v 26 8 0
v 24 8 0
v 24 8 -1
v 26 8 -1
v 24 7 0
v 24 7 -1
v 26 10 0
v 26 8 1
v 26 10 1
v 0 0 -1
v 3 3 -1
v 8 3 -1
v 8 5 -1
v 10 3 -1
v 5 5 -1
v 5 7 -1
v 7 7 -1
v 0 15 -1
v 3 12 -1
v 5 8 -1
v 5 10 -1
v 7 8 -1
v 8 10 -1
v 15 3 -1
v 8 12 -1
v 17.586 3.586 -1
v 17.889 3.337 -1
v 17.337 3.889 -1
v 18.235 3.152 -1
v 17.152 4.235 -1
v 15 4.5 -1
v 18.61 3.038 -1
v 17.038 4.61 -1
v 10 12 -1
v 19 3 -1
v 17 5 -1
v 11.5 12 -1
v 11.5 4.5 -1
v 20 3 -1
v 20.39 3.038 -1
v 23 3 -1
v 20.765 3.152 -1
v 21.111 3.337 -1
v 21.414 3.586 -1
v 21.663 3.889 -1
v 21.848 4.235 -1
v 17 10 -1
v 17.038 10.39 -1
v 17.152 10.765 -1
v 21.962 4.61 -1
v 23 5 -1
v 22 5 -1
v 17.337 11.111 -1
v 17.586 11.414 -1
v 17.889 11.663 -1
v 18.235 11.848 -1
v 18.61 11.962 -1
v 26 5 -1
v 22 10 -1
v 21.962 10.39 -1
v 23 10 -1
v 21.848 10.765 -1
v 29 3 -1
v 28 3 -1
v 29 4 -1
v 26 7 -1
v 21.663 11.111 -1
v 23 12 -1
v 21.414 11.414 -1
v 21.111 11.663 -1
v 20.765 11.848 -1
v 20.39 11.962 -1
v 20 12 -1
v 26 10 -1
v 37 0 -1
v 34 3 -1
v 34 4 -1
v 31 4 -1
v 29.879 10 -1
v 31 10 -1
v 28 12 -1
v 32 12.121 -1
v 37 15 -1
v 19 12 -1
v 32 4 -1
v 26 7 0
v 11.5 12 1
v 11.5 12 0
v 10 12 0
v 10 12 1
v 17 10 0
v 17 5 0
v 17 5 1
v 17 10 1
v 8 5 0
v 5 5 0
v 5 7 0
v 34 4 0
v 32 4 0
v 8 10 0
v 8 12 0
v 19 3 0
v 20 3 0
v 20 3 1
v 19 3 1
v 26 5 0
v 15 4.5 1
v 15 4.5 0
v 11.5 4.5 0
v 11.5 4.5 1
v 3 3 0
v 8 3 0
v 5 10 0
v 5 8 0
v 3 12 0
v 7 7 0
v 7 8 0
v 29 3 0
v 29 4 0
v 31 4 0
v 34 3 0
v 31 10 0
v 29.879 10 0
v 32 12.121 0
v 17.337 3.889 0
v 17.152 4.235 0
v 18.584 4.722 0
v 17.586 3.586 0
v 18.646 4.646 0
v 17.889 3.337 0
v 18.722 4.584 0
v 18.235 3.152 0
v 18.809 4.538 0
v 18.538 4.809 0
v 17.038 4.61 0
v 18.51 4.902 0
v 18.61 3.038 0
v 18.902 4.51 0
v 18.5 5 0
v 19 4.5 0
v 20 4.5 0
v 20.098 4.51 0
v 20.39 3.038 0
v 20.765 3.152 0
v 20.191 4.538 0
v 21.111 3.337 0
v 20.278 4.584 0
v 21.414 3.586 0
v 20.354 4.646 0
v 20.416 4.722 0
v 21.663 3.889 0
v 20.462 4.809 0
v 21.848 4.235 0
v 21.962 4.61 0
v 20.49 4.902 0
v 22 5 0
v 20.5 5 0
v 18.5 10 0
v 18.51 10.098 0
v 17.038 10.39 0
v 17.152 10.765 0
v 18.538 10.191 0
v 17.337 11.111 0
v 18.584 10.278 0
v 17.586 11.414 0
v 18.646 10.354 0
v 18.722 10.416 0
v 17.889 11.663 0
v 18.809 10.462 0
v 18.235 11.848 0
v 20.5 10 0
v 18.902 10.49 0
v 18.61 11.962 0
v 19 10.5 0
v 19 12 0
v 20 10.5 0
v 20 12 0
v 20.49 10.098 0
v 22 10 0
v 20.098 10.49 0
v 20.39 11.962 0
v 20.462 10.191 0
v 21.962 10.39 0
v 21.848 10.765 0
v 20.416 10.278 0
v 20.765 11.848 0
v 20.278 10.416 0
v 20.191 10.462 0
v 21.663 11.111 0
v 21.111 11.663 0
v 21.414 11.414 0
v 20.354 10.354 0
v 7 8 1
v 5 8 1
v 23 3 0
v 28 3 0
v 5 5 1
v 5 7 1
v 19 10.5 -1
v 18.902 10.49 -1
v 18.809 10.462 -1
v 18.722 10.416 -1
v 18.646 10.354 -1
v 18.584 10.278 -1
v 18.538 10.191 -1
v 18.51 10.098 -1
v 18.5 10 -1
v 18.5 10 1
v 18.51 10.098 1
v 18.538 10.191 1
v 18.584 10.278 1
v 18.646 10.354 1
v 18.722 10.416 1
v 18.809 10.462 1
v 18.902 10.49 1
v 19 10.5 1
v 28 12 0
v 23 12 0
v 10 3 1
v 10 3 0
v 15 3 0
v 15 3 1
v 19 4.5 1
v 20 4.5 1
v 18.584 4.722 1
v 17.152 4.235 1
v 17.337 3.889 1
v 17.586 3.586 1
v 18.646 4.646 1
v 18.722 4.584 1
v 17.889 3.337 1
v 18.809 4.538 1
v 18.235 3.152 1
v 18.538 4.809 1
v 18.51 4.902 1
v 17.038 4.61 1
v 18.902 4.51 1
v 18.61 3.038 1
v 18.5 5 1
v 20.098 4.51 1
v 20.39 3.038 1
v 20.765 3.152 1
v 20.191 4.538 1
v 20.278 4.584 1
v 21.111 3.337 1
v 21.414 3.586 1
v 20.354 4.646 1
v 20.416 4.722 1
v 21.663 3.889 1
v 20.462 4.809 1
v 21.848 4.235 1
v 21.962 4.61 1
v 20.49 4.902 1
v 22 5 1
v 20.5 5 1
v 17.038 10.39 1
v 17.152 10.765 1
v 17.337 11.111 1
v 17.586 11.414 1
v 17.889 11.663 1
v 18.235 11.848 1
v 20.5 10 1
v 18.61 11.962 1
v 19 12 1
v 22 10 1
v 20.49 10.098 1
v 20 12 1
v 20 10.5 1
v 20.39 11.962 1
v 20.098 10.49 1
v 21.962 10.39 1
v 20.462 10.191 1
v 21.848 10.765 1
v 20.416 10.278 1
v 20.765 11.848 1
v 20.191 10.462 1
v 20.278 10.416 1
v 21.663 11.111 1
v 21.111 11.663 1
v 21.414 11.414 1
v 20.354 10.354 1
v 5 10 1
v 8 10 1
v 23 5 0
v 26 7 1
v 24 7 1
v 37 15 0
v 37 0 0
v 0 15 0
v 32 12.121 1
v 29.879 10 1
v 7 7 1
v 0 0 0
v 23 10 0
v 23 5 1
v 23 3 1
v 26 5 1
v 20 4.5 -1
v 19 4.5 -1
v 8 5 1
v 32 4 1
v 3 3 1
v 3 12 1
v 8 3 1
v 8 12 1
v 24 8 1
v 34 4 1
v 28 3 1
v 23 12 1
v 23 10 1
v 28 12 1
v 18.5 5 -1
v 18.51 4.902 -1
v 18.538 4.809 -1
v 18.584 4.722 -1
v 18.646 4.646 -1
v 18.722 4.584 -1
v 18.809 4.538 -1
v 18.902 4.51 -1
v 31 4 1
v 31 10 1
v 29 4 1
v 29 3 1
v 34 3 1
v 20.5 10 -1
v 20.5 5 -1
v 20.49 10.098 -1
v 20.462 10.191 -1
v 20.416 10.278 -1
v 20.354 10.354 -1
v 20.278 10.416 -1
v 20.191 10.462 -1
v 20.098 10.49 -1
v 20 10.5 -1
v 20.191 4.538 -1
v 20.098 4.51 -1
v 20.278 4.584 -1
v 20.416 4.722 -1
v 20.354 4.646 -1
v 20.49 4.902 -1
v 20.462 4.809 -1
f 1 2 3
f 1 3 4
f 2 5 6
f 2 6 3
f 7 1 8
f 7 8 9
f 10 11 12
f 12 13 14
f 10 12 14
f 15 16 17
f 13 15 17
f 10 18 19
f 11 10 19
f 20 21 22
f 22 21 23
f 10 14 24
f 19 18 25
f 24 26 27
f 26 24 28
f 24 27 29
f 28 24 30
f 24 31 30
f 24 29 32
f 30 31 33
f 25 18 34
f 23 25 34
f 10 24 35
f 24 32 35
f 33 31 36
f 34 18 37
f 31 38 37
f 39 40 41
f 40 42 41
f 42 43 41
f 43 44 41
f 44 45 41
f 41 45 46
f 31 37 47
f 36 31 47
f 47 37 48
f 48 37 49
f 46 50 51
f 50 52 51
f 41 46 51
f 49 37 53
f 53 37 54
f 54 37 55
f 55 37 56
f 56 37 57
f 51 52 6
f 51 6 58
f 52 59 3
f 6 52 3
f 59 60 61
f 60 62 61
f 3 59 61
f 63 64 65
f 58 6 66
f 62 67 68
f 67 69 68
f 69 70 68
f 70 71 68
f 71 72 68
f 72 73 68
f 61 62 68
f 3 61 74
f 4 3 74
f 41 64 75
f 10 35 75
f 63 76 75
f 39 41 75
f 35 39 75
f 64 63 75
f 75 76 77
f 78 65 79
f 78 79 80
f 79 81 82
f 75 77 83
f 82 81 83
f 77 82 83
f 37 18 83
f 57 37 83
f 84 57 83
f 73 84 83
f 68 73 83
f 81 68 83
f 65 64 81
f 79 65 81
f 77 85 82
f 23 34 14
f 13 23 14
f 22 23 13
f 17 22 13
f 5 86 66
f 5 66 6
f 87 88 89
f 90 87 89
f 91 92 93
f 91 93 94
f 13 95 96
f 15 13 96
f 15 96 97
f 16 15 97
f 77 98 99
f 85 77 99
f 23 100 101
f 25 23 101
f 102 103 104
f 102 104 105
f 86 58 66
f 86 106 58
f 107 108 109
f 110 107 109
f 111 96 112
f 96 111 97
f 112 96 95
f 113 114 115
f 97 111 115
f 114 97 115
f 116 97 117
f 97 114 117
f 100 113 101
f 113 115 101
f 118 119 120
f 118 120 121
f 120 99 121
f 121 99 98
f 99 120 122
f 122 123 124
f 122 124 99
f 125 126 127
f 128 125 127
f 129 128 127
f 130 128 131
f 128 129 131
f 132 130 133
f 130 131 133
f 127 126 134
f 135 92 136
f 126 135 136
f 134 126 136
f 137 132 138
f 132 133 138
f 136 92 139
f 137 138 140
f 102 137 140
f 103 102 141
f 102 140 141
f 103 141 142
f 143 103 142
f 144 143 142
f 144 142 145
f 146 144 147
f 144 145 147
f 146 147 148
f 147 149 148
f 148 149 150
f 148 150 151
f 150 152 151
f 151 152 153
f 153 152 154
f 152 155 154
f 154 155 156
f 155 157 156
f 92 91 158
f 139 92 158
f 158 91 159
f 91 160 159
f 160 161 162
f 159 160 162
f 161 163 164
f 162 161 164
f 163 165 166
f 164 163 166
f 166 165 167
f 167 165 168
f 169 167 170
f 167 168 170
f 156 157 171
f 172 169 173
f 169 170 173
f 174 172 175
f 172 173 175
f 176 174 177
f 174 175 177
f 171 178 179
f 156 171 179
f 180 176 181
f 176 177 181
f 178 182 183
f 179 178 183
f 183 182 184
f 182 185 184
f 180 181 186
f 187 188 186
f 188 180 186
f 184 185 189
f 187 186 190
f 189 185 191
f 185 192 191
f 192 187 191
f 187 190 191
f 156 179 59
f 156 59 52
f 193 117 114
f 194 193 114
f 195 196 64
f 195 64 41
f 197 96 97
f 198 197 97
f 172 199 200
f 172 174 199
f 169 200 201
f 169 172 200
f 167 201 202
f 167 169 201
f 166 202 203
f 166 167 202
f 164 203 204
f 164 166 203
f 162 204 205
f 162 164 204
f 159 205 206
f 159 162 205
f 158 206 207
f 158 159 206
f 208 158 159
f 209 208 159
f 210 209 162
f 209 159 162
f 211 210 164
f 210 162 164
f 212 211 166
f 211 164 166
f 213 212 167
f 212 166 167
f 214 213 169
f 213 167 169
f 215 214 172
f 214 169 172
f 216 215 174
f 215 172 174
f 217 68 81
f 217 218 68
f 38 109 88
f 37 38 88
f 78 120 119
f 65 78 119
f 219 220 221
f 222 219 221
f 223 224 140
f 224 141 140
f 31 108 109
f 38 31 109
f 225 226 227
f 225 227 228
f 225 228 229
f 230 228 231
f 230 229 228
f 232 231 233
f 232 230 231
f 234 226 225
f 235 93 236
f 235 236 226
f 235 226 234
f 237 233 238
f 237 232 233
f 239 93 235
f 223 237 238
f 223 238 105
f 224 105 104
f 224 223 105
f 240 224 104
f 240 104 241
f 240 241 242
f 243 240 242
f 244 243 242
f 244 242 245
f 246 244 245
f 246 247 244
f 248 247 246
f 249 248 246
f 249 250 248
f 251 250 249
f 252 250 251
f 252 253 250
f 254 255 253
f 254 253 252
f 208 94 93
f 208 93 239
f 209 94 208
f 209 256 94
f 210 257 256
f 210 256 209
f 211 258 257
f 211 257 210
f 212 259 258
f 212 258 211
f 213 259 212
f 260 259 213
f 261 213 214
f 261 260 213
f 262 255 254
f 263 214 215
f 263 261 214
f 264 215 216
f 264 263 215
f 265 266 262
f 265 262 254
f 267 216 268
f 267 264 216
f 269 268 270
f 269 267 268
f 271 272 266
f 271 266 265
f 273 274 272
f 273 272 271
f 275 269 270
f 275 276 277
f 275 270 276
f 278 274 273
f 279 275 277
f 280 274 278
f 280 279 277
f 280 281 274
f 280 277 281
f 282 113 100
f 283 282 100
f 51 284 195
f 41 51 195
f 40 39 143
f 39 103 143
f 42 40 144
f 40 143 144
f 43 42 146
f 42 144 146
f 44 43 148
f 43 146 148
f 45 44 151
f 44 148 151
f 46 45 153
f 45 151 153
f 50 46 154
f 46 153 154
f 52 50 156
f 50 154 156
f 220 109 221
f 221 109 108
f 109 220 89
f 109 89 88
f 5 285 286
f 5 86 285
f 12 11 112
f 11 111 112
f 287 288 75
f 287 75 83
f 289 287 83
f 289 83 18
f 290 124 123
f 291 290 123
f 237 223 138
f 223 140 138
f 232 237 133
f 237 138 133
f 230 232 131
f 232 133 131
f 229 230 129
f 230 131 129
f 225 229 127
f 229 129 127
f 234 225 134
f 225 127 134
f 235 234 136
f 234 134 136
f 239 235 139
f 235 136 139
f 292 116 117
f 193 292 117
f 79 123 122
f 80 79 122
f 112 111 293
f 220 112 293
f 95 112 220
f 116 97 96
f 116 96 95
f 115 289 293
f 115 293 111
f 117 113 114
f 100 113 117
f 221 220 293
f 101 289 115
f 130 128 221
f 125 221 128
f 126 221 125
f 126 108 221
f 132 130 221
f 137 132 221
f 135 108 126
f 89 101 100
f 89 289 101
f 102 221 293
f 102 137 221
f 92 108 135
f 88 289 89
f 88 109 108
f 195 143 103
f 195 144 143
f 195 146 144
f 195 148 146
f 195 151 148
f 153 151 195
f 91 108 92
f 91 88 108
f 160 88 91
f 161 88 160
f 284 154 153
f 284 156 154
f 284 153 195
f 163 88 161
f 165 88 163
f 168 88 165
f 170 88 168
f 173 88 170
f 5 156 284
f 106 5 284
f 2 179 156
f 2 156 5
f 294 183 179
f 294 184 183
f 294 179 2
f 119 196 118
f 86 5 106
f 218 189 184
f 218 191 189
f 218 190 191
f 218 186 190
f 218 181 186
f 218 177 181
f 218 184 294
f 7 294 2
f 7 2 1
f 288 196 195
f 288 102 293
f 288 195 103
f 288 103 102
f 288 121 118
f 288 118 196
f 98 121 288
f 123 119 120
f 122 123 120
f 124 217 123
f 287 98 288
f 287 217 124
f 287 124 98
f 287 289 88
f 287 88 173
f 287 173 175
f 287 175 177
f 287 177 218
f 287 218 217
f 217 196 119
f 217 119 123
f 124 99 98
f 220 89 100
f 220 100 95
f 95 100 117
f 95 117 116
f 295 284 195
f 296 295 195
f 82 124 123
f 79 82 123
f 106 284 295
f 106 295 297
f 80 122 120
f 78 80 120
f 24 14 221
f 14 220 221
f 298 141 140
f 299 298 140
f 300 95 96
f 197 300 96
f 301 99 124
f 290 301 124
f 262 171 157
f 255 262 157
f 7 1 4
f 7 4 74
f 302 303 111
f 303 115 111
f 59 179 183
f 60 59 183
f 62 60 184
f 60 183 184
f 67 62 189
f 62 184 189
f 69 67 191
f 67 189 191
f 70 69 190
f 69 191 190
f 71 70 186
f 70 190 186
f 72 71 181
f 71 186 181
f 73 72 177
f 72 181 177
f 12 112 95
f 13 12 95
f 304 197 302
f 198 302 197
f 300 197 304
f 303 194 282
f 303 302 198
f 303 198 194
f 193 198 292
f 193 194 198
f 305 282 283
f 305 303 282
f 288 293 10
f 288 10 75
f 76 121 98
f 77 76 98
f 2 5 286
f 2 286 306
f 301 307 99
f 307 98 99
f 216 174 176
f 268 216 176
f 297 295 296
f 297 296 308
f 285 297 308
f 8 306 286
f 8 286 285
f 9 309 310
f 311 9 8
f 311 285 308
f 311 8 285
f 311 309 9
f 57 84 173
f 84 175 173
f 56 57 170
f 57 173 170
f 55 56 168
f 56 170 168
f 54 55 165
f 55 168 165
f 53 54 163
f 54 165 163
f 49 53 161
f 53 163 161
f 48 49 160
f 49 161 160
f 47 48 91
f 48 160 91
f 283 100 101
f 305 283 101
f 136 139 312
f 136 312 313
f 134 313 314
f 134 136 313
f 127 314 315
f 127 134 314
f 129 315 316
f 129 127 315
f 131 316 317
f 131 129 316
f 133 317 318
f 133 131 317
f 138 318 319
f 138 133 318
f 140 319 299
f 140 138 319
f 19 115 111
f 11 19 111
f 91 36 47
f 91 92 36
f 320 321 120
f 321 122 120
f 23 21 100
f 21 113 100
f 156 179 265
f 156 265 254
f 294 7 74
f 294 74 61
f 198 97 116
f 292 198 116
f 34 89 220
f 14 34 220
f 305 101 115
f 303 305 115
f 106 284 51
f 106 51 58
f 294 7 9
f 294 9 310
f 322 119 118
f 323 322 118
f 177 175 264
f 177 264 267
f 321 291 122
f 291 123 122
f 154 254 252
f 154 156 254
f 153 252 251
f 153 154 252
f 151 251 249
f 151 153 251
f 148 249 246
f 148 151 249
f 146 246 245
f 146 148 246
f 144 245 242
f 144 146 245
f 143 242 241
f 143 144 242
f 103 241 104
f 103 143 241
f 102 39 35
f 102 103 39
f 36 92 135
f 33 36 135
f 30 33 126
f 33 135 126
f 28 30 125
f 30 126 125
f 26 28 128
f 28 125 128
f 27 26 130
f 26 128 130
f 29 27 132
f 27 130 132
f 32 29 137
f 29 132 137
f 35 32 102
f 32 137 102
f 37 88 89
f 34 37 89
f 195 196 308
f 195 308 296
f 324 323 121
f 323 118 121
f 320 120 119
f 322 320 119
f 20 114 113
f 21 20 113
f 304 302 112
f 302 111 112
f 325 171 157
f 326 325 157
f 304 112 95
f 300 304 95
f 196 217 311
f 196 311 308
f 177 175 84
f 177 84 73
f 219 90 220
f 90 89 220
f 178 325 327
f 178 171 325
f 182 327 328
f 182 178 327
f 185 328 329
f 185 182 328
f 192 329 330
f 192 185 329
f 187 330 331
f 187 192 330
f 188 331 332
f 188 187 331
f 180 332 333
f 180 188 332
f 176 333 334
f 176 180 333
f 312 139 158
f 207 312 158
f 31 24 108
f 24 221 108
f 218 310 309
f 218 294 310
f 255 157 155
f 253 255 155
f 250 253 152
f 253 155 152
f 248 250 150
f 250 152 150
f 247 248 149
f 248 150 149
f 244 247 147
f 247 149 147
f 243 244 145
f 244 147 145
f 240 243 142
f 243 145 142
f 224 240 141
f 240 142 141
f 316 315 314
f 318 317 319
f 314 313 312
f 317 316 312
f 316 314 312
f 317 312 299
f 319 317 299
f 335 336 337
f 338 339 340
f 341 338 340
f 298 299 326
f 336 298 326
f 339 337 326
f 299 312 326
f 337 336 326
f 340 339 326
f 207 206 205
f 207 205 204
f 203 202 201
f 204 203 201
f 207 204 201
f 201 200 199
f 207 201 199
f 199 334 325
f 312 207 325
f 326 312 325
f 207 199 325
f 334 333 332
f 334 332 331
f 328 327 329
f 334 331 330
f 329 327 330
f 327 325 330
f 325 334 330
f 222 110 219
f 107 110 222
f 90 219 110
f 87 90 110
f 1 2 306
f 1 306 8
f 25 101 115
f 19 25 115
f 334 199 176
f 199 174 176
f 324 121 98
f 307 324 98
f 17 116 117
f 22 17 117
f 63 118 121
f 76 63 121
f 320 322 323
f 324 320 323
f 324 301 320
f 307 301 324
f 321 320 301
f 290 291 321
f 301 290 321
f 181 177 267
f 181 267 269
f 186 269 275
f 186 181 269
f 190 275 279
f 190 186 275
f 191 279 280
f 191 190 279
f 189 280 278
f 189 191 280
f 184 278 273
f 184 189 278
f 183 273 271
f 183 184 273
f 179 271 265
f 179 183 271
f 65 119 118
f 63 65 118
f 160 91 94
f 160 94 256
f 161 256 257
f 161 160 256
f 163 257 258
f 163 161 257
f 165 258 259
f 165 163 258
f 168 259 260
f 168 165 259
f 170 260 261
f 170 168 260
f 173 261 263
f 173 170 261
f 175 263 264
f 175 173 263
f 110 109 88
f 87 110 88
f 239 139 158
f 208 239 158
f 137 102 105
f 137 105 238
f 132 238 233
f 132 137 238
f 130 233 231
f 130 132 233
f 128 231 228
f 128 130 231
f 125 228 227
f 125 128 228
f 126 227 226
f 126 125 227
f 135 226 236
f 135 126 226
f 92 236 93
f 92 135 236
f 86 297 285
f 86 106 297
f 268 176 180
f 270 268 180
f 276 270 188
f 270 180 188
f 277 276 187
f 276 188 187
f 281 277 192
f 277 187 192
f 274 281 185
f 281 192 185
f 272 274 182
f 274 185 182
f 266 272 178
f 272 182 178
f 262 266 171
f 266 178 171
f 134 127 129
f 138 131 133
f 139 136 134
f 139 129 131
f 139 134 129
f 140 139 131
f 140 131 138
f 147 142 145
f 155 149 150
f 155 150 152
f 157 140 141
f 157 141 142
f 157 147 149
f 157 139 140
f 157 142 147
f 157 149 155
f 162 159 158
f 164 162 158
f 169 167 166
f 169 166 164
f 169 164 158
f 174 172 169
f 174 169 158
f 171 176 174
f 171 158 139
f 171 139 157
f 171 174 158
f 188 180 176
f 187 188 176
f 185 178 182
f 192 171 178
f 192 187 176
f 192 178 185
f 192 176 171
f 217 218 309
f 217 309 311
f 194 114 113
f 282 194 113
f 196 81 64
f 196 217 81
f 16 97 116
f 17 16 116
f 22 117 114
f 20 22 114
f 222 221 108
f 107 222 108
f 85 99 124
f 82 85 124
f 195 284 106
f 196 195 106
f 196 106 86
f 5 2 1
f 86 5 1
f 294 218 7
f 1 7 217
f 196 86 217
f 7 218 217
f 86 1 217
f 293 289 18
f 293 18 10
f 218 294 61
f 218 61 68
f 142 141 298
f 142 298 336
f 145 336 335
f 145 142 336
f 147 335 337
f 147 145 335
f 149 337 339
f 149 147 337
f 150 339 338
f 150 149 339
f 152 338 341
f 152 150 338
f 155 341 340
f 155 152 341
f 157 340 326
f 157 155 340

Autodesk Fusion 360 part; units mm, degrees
sketch "Sketch1" plane through (0, 0, 0) normal (0, 0, 1) x (1, 0, 0)
  line L0 (0, 0) -> (37, 0)
  line L1 (37, 0) -> (37, 15)
  line L2 (37, 15) -> (0, 15)
  line L3 (0, 15) -> (0, 0)
  line L4 (3, 12) -> (3, 3)
  line L5 (3, 3) -> (8, 3)
  line L6 (8, 3) -> (8, 5)
  line L7 (8, 5) -> (5, 5)
  line L8 (5, 5) -> (5, 7)
  line L9 (5, 7) -> (7, 7)
  line L10 (7, 7) -> (7, 8)
  line L11 (7, 8) -> (5, 8)
  line L12 (5, 8) -> (5, 10)
  line L13 (5, 10) -> (8, 10)
  line L14 (8, 10) -> (8, 12)
  line L15 (8, 12) -> (3, 12)
  line L16 (10, 12) -> (10, 3)
  line L17 (10, 3) -> (15, 3)
  line L18 (15, 3) -> (15, 4.5)
  line L19 (15, 4.5) -> (11.5, 4.5)
  line L20 (11.5, 4.5) -> (11.5, 12)
  line L21 (11.5, 12) -> (10, 12)
  line L22 (19, 12) -> (20, 12)
  line L23 (22, 10) -> (22, 5)
  line L24 (20, 3) -> (19, 3)
  line L25 (17, 5) -> (17, 10)
  line L26 (19, 10.5) -> (20, 10.5)
  line L27 (20.5, 10) -> (20.5, 5)
  line L28 (20, 4.5) -> (19, 4.5)
  line L29 (18.5, 5) -> (18.5, 10)
  line L30 (23, 12) -> (28, 12)
  line L31 (28, 12) -> (28, 3)
  line L32 (28, 3) -> (23, 3)
  line L33 (23, 5) -> (23, 3)
  line L34 (23, 5) -> (26, 5)
  line L35 (26, 5) -> (26, 7)
  line L36 (26, 7) -> (24, 7)
  line L37 (24, 7) -> (24, 8)
  line L38 (24, 8) -> (26, 8)
  line L39 (26, 8) -> (26, 10)
  line L40 (26, 10) -> (23, 10)
  line L41 (23, 10) -> (23, 12)
  line L42 (32, 12.1213) -> (29.8787, 10)
  line L43 (29.8787, 10) -> (31, 10)
  line L44 (31, 10) -> (31, 4)
  line L45 (31, 4) -> (29, 4)
  line L46 (29, 4) -> (29, 3)
  line L47 (29, 3) -> (34, 3)
  line L48 (34, 3) -> (34, 4)
  line L49 (34, 4) -> (32, 4)
  line L50 (32, 4) -> (32, 12.1213)
  arc A0 (19, 12) -> (17, 10) centre (19, 10) ccw
  arc A1 (22, 10) -> (20, 12) centre (20, 10) ccw
  arc A2 (20, 3) -> (22, 5) centre (20, 5) ccw
  arc A3 (17, 5) -> (19, 3) centre (19, 5) ccw
  arc A4 (19, 10.5) -> (18.5, 10) centre (19, 10) ccw
  arc A5 (20.5, 10) -> (20, 10.5) centre (20, 10) ccw
  arc A6 (20, 4.5) -> (20.5, 5) centre (20, 5) ccw
  arc A7 (18.5, 5) -> (19, 4.5) centre (19, 5) ccw
  point P0 (17, 12)
  point P1 (22, 3)
  point P2 (17, 3)
  dimension "d1" = 37
  dimension "d2" = 15
  dimension "d3" = 9
  dimension "d4" = 5
  dimension "d5" = 3
  dimension "d6" = 3
  dimension "d7" = 2
  dimension "d8" = 2
  dimension "d9" = 2
  dimension "d10" = 2
  dimension "d11" = 5
  dimension "d12" = 4
  dimension "d13" = 2
  dimension "d14" = 2
  dimension "d15" = 2
  dimension "d16" = 9
  dimension "d17" = 3
  dimension "d18" = 5
  dimension "d19" = 3.5
  dimension "d20" = 7.5
  dimension "d21" = 2
  dimension "d22" = 3
  dimension "d23" = 5
  dimension "d24" = 9
  dimension "d25" = 2
  dimension "d26" = 2
  dimension "d27" = 2
  dimension "d28" = 2
  dimension "d29" = 1.5
  dimension "d30" = 1.5
  dimension "d31" = 1.5
  dimension "d32" = 1.5
  dimension "d33" = 0.5
  dimension "d34" = 1
  dimension "d35" = 3
  dimension "d36" = 9
  dimension "d37" = 2
  dimension "d38" = 2
  dimension "d39" = 5
  dimension "d40" = 1
  dimension "d41" = 2
  dimension "d42" = 2
  dimension "d43" = 2
  dimension "d44" = 2
  dimension "d45" = 4
  dimension "d46" = 5
  dimension "d47" = 3
  dimension "d48" = 1
  dimension "d49" = 2
  dimension "d50" = 2
  dimension "d51" = 1
  dimension "d52" = 1
  dimension "d53" = 45
  dimension "d54" = 6
  dimension "d55" = 3
  dimension "d56" = 0.5
extrude "Extrude1" add sketch "Sketch1" against normal blind 1 makes body 1 at (34.3333, 10.3738, 0) makes body 2 at (19.8333, 8.3333, 0)
extrude "Extrude2" add sketch "Sketch1" along normal blind 1 separate body contours L4 L5 L6 L7 L8 L9 L10 L11 L12 L13 L14 L15 | L16 L17 L18 L19 L20 L21 | L22 L23 L24 L25 A0 A1 A2 A3 | L30 L31 L32 L33 L34 L35 L36 L37 L38 L39 L40 L41 | L42 L43 L44 L45 L46 L47 L48 L49 L50 makes body 3 at (17.5, 6.6667, 0) makes body 4 at (10.5, 6.5, 0) makes body 5 at (27.3333, 7.6667, 0) makes body 6 at (3.6667, 7.6667, 0) makes body 7 at (31.6667, 8.7071, 0)
